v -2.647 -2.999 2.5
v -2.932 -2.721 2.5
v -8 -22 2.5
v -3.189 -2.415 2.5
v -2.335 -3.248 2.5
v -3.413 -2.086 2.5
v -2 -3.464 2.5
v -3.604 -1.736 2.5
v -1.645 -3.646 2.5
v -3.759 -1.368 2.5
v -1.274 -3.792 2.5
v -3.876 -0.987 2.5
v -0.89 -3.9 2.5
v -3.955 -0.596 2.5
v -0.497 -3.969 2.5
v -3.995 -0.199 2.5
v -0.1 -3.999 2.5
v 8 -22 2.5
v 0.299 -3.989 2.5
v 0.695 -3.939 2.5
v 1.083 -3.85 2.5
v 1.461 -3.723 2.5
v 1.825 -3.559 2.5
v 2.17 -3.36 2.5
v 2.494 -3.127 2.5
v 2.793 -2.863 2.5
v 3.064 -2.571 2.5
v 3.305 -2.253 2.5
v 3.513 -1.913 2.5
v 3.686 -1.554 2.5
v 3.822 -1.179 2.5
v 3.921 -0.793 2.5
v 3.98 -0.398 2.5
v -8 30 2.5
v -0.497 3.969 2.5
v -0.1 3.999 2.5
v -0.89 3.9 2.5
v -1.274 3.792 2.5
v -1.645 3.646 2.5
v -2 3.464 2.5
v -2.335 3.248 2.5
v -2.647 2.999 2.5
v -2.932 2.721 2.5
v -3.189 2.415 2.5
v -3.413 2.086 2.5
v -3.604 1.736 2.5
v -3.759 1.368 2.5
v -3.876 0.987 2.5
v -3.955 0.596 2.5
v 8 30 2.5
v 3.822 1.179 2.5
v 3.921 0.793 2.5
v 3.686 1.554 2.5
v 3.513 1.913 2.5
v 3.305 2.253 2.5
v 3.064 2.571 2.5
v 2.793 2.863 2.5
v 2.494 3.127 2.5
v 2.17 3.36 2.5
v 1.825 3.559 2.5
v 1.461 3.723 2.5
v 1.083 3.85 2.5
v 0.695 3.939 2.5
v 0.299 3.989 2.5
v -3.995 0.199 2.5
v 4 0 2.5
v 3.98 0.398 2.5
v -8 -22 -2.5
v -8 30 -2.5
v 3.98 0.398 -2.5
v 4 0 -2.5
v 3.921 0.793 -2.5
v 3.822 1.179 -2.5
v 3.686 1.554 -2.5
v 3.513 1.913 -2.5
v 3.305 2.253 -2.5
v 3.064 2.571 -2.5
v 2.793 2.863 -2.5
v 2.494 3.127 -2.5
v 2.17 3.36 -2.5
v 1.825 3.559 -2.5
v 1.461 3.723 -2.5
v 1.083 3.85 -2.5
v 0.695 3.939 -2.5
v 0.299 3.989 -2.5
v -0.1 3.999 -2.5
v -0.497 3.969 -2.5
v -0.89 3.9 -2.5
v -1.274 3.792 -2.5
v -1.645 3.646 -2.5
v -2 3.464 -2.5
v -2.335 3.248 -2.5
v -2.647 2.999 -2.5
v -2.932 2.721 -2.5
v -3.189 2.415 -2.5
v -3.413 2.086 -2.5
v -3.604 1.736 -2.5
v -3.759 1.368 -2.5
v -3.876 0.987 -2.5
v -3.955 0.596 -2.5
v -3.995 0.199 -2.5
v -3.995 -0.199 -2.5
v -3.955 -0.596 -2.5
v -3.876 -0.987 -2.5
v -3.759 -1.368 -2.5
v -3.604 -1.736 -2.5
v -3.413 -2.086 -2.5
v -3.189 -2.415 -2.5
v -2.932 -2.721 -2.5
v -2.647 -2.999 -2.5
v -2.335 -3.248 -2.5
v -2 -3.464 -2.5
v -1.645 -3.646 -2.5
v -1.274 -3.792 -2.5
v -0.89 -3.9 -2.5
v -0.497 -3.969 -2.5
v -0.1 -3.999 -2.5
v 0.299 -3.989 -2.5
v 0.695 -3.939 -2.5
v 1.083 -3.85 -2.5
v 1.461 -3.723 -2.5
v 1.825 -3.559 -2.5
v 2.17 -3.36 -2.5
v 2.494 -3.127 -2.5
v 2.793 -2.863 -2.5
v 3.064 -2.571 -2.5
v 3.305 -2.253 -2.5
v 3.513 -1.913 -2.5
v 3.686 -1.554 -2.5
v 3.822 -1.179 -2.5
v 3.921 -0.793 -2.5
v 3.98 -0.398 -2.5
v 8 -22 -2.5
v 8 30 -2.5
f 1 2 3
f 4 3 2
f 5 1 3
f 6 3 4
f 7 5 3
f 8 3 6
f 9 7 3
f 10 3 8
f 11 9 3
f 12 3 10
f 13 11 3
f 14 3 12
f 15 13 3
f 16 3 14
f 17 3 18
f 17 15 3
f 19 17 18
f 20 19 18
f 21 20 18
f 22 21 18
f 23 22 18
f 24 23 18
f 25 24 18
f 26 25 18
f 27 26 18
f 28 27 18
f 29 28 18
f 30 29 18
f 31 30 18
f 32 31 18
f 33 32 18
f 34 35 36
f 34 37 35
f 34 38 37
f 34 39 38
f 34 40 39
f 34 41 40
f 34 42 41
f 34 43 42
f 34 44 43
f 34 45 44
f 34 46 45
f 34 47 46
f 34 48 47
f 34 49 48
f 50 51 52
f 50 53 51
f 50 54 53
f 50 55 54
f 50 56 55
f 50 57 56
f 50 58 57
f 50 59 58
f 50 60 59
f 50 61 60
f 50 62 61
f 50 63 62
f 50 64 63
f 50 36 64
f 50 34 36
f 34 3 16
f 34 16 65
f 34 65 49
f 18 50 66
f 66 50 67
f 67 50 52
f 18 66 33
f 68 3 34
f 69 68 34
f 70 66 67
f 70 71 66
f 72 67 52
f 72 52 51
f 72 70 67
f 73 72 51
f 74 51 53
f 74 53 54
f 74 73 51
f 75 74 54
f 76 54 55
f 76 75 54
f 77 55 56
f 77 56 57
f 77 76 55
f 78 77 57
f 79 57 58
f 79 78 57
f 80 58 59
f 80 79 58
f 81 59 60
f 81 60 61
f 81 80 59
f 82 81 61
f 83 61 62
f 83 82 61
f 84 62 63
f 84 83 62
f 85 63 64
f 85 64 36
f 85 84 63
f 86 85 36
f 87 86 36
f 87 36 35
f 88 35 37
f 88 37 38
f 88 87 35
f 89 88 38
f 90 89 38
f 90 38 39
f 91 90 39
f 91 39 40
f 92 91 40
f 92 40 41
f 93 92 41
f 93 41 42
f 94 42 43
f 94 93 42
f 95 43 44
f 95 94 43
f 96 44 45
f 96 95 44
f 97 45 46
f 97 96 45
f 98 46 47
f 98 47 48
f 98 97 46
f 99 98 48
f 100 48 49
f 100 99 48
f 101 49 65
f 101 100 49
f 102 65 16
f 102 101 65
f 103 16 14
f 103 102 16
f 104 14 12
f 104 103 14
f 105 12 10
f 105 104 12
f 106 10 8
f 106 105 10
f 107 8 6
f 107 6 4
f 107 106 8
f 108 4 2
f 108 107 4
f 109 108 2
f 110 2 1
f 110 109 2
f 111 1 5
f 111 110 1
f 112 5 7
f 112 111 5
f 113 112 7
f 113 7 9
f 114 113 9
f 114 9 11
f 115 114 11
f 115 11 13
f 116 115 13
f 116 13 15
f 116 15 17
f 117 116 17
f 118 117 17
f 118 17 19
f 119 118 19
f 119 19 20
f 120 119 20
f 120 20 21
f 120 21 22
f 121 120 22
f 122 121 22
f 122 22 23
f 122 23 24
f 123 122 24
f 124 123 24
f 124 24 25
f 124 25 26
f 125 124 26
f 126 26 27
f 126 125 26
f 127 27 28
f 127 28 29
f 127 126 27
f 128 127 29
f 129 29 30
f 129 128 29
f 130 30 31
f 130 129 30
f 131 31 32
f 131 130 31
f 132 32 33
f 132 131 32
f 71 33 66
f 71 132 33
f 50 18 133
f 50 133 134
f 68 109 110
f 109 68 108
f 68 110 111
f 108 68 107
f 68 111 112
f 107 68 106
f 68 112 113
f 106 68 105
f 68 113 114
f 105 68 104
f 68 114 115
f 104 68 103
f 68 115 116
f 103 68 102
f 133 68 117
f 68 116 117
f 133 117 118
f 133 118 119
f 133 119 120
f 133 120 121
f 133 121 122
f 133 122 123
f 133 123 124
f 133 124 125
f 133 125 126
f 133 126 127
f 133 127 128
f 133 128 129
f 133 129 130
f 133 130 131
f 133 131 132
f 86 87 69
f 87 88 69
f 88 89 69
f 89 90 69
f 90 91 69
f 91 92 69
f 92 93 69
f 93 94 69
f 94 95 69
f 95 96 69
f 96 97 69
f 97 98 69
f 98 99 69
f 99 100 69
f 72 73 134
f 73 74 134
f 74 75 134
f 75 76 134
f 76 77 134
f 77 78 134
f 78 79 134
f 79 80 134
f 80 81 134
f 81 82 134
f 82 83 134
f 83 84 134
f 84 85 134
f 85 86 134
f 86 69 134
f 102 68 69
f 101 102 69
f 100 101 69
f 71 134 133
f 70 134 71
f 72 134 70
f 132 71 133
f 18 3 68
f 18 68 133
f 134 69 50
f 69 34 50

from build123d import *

# Parameters (mm, degrees)
ESBO_O1_W       = 16
ESBO_O1_H       = 52
ESBO_O1_R       = 4
EXTRUS_O1_DEPTH = 2.5


with BuildPart() as part:
    # Esboço1 → Extrusão1 (new, symmetric)
    with BuildSketch(Plane.XY):
        with Locations((0, 4)):
            Rectangle(ESBO_O1_W, ESBO_O1_H)
        Circle(ESBO_O1_R, mode=Mode.SUBTRACT)
    extrude(amount=EXTRUS_O1_DEPTH, both=True)


solid = part.part
